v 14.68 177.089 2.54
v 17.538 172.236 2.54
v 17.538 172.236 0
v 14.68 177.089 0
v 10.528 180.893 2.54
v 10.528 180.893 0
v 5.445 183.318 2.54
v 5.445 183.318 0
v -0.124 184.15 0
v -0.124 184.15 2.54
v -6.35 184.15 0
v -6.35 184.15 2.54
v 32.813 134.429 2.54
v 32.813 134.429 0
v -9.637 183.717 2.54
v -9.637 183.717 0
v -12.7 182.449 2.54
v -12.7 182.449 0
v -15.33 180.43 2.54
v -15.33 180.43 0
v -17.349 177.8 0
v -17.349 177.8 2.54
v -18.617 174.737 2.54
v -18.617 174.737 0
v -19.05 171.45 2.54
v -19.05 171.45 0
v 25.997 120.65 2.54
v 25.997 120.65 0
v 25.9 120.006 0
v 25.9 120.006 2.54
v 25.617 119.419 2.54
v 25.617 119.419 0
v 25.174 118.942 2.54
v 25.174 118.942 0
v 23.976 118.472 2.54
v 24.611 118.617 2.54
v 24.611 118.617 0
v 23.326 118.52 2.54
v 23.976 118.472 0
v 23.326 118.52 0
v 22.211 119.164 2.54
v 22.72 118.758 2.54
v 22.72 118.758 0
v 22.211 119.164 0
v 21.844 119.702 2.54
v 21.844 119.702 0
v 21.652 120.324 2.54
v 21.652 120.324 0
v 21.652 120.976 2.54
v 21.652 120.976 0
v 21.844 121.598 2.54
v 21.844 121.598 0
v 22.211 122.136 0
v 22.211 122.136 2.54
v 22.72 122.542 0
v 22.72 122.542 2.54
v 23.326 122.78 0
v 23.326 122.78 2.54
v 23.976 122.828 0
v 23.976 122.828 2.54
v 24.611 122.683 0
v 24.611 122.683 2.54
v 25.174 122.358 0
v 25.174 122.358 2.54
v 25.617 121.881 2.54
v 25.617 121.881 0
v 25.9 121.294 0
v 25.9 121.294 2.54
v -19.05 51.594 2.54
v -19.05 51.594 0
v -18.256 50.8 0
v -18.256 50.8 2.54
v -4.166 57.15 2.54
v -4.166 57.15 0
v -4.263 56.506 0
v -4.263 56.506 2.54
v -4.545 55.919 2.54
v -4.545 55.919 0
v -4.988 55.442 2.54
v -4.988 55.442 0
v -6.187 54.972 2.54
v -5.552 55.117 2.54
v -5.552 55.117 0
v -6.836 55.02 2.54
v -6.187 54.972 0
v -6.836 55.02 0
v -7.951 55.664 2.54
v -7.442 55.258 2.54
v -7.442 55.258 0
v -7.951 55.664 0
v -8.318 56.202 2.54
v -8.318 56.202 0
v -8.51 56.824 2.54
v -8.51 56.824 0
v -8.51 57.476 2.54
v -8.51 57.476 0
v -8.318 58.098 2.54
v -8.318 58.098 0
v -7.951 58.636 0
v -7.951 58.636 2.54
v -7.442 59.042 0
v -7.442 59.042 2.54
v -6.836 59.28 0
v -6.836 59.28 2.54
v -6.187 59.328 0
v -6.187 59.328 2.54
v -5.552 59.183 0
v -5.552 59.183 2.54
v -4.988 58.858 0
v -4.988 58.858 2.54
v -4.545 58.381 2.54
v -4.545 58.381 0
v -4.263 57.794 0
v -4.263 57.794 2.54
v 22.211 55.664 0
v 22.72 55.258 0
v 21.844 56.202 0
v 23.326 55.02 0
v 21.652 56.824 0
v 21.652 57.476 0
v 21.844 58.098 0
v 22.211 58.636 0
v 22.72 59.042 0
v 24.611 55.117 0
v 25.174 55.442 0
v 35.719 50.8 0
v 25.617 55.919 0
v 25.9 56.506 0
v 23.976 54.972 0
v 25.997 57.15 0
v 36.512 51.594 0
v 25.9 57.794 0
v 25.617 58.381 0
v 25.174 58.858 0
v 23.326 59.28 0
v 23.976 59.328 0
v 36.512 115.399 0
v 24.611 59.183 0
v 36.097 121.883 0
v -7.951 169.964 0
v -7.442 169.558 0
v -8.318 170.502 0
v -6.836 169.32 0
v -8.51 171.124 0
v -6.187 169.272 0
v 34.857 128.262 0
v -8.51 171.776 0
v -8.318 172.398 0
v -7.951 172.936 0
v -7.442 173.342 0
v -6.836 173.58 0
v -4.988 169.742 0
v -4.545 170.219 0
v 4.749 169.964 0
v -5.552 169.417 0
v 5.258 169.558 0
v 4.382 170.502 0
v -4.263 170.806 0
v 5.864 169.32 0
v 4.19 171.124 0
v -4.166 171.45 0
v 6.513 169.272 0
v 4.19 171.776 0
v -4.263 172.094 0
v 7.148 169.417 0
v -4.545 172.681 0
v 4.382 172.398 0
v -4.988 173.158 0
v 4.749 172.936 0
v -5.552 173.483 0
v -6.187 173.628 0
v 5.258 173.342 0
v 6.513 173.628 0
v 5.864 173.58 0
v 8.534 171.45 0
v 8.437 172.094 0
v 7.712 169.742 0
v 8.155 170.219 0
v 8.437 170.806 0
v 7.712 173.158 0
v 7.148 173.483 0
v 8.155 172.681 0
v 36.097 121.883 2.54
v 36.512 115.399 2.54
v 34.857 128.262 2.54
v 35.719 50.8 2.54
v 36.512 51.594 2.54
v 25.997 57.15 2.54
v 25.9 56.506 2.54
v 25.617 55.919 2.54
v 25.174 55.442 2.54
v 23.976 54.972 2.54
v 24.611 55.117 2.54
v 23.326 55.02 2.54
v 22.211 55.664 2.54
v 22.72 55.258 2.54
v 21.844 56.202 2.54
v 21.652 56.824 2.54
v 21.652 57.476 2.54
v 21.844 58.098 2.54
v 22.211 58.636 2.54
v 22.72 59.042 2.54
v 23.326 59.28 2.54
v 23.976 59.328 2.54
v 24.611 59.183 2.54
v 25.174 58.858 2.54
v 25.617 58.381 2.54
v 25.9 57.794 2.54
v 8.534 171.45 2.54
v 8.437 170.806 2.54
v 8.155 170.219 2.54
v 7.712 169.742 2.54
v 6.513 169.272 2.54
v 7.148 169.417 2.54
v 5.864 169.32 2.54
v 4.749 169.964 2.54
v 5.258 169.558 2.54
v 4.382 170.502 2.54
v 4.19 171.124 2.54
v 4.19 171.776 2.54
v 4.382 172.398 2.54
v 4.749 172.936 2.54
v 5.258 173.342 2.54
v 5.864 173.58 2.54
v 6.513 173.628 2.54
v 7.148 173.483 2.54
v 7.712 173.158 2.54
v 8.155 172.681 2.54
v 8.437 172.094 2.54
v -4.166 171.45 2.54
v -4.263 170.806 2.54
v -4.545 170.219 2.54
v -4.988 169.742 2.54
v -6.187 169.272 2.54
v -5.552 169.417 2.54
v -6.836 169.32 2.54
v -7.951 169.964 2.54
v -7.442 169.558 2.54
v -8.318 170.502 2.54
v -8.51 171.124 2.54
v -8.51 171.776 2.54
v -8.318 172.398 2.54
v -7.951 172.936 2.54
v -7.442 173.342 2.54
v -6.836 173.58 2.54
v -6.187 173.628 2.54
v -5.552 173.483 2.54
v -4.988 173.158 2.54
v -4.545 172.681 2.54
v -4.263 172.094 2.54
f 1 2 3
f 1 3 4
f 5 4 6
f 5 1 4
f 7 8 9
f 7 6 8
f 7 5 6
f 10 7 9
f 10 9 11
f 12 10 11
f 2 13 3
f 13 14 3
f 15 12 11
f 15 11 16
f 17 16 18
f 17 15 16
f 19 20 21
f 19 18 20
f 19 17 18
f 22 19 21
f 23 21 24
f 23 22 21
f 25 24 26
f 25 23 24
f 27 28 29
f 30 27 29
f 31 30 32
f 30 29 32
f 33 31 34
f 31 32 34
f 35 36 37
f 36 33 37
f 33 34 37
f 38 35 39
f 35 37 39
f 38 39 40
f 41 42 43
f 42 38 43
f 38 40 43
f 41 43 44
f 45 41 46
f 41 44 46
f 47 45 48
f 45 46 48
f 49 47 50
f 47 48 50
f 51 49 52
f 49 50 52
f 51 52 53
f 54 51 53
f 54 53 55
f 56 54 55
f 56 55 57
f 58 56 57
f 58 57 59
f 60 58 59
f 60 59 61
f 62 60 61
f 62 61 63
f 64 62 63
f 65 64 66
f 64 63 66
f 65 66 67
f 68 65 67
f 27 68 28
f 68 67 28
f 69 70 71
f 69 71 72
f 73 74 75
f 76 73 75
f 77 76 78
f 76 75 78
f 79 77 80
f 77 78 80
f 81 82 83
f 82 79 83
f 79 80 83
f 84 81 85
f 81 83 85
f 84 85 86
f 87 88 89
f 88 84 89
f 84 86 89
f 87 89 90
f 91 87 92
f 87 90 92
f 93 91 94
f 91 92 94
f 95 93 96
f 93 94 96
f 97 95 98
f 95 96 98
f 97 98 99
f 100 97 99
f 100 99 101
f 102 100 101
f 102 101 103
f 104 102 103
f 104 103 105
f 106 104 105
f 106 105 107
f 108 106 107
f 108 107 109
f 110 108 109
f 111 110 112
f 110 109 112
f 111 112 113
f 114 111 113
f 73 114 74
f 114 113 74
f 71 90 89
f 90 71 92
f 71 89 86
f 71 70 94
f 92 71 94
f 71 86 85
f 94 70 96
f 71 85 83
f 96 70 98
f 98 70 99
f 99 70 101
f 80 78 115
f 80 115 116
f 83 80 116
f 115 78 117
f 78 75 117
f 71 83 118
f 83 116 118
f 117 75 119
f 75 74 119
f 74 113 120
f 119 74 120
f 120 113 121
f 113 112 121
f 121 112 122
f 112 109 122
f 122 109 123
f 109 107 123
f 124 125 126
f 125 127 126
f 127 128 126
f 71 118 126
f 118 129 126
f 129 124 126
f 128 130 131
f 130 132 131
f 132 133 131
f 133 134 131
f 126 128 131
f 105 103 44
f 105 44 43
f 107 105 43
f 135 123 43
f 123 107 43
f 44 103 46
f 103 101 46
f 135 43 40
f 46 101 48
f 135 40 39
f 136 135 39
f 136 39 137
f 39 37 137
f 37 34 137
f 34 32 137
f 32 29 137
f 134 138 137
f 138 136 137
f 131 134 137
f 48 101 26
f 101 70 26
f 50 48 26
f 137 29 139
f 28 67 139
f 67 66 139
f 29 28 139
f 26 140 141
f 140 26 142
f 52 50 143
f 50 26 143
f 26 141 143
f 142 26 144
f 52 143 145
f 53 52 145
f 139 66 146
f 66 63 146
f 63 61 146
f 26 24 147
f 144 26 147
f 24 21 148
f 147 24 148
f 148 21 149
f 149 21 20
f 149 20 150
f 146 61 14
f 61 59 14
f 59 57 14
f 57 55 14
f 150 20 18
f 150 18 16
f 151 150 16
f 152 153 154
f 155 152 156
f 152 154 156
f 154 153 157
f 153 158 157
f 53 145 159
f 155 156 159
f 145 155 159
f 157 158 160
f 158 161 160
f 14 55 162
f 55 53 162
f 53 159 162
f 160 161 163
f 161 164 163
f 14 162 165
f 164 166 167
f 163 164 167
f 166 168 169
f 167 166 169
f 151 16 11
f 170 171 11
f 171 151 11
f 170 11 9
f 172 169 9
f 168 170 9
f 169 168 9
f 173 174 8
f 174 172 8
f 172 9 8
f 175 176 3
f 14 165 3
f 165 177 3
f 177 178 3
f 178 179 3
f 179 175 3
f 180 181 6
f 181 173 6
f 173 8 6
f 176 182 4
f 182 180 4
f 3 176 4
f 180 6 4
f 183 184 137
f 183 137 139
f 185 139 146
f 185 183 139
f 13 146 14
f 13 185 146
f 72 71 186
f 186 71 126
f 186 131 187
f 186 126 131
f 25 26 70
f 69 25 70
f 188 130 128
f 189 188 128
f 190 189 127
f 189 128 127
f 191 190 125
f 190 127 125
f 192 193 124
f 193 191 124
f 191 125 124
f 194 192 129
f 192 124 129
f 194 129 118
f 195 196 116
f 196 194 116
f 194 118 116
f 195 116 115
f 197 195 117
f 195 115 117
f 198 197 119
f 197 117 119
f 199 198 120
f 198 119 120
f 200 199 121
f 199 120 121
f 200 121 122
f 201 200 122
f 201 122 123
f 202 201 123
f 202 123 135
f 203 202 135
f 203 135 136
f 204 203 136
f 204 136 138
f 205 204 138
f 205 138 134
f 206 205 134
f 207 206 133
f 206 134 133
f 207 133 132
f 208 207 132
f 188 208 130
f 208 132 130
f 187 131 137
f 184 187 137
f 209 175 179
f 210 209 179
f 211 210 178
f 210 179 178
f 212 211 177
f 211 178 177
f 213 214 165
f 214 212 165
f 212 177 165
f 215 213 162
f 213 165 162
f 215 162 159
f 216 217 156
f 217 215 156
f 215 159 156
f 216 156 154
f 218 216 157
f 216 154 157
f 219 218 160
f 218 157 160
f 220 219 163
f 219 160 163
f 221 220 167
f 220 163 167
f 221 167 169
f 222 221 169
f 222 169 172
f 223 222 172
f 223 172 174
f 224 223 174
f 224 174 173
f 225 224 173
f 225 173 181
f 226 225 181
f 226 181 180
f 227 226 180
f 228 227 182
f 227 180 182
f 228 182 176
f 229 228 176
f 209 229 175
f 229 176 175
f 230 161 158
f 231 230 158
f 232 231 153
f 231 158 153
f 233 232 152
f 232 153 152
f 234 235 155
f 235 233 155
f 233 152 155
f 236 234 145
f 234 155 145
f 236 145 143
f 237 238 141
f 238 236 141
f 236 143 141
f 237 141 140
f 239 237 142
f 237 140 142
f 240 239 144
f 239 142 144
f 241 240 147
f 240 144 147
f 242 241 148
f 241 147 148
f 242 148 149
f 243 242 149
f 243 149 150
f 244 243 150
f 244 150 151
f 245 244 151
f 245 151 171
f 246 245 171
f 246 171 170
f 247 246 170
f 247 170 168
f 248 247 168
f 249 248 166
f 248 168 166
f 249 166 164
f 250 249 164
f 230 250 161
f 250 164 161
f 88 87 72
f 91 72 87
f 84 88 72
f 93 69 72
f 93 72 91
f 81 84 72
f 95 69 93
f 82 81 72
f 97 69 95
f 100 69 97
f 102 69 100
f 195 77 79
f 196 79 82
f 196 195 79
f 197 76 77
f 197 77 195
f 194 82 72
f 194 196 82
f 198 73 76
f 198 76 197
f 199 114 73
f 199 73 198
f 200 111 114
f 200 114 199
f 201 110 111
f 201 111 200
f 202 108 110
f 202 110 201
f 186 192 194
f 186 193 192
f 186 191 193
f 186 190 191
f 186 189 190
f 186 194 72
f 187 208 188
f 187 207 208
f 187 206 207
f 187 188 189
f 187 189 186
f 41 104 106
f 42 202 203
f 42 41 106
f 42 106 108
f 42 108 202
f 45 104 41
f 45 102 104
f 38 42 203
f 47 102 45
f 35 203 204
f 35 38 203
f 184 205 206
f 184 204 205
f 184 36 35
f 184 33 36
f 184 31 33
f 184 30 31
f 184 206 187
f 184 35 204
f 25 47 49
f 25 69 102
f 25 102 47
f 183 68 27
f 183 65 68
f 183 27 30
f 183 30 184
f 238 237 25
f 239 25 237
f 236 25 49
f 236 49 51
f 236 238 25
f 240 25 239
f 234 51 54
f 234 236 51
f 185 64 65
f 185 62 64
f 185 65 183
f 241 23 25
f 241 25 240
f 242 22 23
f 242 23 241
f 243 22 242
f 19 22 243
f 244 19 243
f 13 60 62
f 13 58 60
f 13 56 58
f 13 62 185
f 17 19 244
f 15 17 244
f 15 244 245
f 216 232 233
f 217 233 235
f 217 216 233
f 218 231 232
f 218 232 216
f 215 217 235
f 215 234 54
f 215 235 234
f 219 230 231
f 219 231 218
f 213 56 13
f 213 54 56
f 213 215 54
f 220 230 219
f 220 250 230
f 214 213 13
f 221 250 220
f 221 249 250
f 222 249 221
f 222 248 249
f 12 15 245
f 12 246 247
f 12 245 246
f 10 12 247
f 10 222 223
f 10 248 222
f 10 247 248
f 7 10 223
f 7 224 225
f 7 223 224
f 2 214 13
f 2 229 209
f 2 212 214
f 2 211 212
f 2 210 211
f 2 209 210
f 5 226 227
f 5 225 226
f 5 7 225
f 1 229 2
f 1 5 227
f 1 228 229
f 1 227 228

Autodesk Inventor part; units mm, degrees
ref_plane "YZ Plane" through (0, 0, 0) normal (1, 0, 0) x (0, 1, 0)
ref_plane "XZ Plane" through (0, 0, 0) normal (0, 1, 0) x (-1, 0, 0)
ref_plane "XY Plane" through (0, 0, 0) normal (0, 0, 1) x (1, 0, 0)
sketch "Sketch1" plane through (0, 0, 0) normal (0, 0, 1) x (1, 0, 0)
  circle A0 centre (-6.35, 171.45) radius 2.1844 projected
  circle A1 centre (6.35, 171.45) radius 2.1844 projected
  circle A2 centre (23.8125, 120.65) radius 2.1844 projected
  circle A3 centre (23.8125, 57.15) radius 2.1844 projected
  circle A4 centre (-6.35, 57.15) radius 2.1844 projected
  line L0 (-19.05, 50.8) -> (36.5125, 50.8)
  line L1 (36.5125, 50.8) -> (36.5125, 125.2738)
  line L2 (36.5125, 125.2738) -> (12.725, 184.15)
  line L3 (12.725, 184.15) -> (-19.05, 184.15)
  line L4 (-19.05, 184.15) -> (-19.05, 50.8)
  point P0 (0, 0)
  dimension "d0" = 12.7
  dimension "d2" = 12.7
  dimension "d3" = 6.35
  dimension "d4" = 12.7
  dimension "d5" = 63.5
  dimension "d6" = 112
extrude "Extrusion1" add sketch "Sketch1" along normal blind 2.54
fillet "Fillet1" radius 12.7 1 edges at (-19.05, 184.15, 1.27)
fillet "Fillet2" radius 19.05 1 edges at (12.725, 184.15, 1.27)
fillet "Fillet3" radius 50.8 1 edges at (36.5125, 125.2738, 1.27)
chamfer "Chamfer1" distance 0.7937 angle 45 2 edges at (36.5125, 50.8, 1.27) (-19.05, 50.8, 1.27)
properties part number "funnelFront" material "white pla"
